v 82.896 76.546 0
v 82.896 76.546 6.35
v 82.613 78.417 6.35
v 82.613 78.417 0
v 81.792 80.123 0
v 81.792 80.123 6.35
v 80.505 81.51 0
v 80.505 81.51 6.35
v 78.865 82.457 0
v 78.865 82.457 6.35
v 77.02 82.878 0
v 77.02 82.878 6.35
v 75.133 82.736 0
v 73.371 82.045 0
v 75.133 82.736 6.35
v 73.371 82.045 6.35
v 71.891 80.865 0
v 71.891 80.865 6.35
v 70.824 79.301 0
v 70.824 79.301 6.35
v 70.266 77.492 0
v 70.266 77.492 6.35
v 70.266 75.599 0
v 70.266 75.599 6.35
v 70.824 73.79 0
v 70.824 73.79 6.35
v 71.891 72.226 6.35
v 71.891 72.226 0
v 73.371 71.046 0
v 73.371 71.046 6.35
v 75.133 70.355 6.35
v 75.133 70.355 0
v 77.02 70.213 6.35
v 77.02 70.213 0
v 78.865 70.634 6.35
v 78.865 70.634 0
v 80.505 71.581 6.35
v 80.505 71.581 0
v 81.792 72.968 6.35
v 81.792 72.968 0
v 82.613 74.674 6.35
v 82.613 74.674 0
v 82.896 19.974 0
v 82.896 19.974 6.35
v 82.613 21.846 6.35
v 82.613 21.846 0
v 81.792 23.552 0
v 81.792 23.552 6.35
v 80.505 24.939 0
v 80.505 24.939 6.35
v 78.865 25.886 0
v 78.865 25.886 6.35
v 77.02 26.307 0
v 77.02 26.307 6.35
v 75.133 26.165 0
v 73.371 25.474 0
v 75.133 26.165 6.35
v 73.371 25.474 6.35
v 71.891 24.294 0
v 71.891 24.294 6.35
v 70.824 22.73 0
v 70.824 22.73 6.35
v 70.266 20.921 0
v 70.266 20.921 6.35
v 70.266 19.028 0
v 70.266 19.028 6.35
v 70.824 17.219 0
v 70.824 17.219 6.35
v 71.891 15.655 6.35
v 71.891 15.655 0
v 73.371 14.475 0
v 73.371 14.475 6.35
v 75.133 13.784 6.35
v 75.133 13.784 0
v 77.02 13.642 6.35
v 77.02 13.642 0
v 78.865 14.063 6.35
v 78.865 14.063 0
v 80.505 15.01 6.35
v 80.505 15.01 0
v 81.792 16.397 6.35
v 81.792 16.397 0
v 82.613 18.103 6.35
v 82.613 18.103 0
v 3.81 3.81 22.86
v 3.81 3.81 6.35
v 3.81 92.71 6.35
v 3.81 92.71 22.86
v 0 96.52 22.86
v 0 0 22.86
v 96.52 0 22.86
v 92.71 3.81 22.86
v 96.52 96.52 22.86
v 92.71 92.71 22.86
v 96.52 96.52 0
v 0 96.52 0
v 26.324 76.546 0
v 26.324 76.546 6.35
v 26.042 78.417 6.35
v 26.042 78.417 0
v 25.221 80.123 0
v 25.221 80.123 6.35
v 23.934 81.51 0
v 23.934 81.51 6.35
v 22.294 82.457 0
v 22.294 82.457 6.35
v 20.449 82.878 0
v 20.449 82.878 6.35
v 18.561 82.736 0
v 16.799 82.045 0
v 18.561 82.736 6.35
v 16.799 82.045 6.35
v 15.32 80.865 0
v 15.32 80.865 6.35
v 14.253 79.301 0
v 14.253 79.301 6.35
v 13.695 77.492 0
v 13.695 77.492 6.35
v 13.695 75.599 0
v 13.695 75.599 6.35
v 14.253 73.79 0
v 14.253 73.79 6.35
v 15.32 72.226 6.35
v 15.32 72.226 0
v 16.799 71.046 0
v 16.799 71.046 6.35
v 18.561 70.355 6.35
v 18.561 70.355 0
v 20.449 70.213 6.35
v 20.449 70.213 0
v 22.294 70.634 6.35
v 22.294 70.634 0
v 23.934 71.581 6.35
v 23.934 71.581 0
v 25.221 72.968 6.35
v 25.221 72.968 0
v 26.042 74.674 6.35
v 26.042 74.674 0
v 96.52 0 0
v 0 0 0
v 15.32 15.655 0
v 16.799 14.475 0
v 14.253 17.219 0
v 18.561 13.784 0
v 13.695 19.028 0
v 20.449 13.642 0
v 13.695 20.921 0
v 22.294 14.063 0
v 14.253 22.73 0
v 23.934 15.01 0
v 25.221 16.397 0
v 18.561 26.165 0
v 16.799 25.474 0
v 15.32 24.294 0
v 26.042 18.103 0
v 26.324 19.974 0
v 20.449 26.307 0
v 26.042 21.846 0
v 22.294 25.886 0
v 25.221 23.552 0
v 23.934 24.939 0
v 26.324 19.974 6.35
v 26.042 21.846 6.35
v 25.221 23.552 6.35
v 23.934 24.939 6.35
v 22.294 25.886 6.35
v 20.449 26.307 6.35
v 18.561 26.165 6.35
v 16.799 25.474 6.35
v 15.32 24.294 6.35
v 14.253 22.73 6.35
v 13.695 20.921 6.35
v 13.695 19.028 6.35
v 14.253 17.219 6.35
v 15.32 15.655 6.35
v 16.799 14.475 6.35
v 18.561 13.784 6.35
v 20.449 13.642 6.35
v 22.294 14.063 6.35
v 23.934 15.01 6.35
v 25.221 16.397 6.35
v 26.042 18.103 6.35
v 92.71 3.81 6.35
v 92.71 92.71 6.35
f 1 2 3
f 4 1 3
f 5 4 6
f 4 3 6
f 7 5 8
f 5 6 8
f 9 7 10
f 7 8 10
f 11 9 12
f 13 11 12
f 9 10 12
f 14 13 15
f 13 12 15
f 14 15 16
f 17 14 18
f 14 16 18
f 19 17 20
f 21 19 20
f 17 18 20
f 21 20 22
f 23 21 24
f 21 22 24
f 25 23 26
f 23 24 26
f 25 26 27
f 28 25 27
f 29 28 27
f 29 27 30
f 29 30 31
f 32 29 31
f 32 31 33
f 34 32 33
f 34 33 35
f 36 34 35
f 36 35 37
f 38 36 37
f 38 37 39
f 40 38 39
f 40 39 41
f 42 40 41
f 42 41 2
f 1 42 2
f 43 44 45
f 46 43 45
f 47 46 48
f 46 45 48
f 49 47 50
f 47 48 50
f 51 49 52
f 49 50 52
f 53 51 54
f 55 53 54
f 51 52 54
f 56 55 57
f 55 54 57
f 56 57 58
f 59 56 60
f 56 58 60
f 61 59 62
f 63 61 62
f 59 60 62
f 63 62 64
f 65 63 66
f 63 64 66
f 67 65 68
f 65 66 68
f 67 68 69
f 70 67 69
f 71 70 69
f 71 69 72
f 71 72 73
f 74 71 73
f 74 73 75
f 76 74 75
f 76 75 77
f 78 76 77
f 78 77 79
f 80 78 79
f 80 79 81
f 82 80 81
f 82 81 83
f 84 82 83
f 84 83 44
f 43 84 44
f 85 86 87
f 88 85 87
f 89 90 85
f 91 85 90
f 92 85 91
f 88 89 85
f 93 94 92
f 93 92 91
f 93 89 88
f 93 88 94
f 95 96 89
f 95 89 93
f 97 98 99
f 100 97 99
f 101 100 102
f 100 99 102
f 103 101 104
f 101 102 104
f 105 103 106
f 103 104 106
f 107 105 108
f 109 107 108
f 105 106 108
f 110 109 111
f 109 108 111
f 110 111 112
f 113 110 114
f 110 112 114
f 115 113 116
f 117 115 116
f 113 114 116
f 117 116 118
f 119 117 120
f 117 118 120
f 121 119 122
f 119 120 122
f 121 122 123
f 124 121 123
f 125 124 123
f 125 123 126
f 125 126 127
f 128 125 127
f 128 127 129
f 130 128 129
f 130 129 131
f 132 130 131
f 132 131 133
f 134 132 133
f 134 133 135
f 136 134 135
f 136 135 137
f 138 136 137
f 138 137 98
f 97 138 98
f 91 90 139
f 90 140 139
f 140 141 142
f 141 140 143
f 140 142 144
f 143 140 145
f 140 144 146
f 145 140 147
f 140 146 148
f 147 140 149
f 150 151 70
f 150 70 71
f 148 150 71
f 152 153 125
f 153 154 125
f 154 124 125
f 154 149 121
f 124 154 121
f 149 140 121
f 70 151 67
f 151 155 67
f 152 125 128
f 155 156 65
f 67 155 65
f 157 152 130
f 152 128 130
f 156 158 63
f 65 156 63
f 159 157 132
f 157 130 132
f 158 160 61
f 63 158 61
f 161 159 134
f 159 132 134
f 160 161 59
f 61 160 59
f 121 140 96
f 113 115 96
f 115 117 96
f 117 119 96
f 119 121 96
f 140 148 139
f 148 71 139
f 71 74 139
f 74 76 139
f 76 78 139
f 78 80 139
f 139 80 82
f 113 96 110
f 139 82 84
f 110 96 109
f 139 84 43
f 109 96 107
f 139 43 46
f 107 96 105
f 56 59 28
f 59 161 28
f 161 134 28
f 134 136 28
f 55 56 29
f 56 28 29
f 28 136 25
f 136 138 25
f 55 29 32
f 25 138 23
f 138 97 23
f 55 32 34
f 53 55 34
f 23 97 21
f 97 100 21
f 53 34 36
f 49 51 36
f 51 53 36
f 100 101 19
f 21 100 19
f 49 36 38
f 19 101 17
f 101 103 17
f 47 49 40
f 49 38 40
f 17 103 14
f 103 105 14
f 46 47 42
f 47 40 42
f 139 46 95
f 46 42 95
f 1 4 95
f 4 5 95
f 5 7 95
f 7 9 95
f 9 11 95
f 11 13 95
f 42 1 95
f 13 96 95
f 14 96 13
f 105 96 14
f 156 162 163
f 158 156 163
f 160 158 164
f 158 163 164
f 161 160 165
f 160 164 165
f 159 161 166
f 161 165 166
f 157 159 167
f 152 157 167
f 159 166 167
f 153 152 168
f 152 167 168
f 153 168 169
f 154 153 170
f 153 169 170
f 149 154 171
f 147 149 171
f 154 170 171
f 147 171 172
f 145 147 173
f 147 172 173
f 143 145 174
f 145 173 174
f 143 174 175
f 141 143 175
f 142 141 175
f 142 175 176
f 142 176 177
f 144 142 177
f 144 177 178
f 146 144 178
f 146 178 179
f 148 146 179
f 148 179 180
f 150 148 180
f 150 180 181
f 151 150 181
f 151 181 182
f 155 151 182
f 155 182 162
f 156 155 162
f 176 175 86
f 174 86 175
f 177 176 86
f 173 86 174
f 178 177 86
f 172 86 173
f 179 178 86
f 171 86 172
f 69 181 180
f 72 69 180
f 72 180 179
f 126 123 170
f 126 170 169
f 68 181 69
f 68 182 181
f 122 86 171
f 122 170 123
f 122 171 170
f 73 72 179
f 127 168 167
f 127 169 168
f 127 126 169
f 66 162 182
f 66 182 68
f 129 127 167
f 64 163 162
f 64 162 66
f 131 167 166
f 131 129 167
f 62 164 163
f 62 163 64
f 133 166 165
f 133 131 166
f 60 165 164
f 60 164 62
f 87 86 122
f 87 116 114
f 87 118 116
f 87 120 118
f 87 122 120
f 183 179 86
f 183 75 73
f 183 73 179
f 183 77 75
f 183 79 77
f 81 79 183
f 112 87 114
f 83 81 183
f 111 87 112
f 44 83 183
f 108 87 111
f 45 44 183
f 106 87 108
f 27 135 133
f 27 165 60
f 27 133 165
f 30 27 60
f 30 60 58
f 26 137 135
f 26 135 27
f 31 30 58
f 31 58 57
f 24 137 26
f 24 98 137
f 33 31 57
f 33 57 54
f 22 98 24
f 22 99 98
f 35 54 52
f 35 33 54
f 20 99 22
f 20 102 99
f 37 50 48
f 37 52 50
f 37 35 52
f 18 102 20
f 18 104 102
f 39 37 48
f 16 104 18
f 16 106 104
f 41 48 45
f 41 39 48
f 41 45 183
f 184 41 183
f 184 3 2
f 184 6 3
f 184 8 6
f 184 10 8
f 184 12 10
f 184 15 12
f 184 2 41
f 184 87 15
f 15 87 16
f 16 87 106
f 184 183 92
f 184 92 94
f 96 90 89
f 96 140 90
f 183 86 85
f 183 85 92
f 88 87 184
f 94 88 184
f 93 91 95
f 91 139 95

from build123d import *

# Parameters (mm, degrees)
F0_W     = 96.52
F0_H     = 96.52
F1_DEPTH = 6.35
F2_W     = 96.52
F2_H     = 96.52
F2_W_2   = 88.9
F2_H_2   = 88.9
F3_DEPTH = 16.51
F4_R     = 6.35
F5_DEPTH = 6.351


with BuildPart() as f1:
    # F0 (on Top) → F1 (new body)
    with BuildSketch(Plane.XY):
        with Locations((48.26, 48.26)):
            Rectangle(F0_W, F0_H)
    extrude(amount=F1_DEPTH)

    # F2 (on face) → F3 (join)
    with BuildSketch(Plane.XY.offset(6.35)):
        with Locations((48.26, 48.26)):
            Rectangle(F2_W, F2_H)
        with Locations((48.26, 48.26)):
            Rectangle(F2_W_2, F2_H_2, mode=Mode.SUBTRACT)
    extrude(amount=F3_DEPTH)

    # F4 (on face) → F5 (cut, through all)
    with BuildSketch(Plane.XY.offset(6.35)):
        with Locations((19.974461, 76.545539)):
            Circle(F4_R)
        with Locations((19.974461, 19.974461)):
            Circle(F4_R)
        with Locations((76.545539, 19.974461)):
            Circle(F4_R)
        with Locations((76.545539, 76.545539)):
            Circle(F4_R)
    extrude(amount=-F5_DEPTH, mode=Mode.SUBTRACT)


solid = f1.part
